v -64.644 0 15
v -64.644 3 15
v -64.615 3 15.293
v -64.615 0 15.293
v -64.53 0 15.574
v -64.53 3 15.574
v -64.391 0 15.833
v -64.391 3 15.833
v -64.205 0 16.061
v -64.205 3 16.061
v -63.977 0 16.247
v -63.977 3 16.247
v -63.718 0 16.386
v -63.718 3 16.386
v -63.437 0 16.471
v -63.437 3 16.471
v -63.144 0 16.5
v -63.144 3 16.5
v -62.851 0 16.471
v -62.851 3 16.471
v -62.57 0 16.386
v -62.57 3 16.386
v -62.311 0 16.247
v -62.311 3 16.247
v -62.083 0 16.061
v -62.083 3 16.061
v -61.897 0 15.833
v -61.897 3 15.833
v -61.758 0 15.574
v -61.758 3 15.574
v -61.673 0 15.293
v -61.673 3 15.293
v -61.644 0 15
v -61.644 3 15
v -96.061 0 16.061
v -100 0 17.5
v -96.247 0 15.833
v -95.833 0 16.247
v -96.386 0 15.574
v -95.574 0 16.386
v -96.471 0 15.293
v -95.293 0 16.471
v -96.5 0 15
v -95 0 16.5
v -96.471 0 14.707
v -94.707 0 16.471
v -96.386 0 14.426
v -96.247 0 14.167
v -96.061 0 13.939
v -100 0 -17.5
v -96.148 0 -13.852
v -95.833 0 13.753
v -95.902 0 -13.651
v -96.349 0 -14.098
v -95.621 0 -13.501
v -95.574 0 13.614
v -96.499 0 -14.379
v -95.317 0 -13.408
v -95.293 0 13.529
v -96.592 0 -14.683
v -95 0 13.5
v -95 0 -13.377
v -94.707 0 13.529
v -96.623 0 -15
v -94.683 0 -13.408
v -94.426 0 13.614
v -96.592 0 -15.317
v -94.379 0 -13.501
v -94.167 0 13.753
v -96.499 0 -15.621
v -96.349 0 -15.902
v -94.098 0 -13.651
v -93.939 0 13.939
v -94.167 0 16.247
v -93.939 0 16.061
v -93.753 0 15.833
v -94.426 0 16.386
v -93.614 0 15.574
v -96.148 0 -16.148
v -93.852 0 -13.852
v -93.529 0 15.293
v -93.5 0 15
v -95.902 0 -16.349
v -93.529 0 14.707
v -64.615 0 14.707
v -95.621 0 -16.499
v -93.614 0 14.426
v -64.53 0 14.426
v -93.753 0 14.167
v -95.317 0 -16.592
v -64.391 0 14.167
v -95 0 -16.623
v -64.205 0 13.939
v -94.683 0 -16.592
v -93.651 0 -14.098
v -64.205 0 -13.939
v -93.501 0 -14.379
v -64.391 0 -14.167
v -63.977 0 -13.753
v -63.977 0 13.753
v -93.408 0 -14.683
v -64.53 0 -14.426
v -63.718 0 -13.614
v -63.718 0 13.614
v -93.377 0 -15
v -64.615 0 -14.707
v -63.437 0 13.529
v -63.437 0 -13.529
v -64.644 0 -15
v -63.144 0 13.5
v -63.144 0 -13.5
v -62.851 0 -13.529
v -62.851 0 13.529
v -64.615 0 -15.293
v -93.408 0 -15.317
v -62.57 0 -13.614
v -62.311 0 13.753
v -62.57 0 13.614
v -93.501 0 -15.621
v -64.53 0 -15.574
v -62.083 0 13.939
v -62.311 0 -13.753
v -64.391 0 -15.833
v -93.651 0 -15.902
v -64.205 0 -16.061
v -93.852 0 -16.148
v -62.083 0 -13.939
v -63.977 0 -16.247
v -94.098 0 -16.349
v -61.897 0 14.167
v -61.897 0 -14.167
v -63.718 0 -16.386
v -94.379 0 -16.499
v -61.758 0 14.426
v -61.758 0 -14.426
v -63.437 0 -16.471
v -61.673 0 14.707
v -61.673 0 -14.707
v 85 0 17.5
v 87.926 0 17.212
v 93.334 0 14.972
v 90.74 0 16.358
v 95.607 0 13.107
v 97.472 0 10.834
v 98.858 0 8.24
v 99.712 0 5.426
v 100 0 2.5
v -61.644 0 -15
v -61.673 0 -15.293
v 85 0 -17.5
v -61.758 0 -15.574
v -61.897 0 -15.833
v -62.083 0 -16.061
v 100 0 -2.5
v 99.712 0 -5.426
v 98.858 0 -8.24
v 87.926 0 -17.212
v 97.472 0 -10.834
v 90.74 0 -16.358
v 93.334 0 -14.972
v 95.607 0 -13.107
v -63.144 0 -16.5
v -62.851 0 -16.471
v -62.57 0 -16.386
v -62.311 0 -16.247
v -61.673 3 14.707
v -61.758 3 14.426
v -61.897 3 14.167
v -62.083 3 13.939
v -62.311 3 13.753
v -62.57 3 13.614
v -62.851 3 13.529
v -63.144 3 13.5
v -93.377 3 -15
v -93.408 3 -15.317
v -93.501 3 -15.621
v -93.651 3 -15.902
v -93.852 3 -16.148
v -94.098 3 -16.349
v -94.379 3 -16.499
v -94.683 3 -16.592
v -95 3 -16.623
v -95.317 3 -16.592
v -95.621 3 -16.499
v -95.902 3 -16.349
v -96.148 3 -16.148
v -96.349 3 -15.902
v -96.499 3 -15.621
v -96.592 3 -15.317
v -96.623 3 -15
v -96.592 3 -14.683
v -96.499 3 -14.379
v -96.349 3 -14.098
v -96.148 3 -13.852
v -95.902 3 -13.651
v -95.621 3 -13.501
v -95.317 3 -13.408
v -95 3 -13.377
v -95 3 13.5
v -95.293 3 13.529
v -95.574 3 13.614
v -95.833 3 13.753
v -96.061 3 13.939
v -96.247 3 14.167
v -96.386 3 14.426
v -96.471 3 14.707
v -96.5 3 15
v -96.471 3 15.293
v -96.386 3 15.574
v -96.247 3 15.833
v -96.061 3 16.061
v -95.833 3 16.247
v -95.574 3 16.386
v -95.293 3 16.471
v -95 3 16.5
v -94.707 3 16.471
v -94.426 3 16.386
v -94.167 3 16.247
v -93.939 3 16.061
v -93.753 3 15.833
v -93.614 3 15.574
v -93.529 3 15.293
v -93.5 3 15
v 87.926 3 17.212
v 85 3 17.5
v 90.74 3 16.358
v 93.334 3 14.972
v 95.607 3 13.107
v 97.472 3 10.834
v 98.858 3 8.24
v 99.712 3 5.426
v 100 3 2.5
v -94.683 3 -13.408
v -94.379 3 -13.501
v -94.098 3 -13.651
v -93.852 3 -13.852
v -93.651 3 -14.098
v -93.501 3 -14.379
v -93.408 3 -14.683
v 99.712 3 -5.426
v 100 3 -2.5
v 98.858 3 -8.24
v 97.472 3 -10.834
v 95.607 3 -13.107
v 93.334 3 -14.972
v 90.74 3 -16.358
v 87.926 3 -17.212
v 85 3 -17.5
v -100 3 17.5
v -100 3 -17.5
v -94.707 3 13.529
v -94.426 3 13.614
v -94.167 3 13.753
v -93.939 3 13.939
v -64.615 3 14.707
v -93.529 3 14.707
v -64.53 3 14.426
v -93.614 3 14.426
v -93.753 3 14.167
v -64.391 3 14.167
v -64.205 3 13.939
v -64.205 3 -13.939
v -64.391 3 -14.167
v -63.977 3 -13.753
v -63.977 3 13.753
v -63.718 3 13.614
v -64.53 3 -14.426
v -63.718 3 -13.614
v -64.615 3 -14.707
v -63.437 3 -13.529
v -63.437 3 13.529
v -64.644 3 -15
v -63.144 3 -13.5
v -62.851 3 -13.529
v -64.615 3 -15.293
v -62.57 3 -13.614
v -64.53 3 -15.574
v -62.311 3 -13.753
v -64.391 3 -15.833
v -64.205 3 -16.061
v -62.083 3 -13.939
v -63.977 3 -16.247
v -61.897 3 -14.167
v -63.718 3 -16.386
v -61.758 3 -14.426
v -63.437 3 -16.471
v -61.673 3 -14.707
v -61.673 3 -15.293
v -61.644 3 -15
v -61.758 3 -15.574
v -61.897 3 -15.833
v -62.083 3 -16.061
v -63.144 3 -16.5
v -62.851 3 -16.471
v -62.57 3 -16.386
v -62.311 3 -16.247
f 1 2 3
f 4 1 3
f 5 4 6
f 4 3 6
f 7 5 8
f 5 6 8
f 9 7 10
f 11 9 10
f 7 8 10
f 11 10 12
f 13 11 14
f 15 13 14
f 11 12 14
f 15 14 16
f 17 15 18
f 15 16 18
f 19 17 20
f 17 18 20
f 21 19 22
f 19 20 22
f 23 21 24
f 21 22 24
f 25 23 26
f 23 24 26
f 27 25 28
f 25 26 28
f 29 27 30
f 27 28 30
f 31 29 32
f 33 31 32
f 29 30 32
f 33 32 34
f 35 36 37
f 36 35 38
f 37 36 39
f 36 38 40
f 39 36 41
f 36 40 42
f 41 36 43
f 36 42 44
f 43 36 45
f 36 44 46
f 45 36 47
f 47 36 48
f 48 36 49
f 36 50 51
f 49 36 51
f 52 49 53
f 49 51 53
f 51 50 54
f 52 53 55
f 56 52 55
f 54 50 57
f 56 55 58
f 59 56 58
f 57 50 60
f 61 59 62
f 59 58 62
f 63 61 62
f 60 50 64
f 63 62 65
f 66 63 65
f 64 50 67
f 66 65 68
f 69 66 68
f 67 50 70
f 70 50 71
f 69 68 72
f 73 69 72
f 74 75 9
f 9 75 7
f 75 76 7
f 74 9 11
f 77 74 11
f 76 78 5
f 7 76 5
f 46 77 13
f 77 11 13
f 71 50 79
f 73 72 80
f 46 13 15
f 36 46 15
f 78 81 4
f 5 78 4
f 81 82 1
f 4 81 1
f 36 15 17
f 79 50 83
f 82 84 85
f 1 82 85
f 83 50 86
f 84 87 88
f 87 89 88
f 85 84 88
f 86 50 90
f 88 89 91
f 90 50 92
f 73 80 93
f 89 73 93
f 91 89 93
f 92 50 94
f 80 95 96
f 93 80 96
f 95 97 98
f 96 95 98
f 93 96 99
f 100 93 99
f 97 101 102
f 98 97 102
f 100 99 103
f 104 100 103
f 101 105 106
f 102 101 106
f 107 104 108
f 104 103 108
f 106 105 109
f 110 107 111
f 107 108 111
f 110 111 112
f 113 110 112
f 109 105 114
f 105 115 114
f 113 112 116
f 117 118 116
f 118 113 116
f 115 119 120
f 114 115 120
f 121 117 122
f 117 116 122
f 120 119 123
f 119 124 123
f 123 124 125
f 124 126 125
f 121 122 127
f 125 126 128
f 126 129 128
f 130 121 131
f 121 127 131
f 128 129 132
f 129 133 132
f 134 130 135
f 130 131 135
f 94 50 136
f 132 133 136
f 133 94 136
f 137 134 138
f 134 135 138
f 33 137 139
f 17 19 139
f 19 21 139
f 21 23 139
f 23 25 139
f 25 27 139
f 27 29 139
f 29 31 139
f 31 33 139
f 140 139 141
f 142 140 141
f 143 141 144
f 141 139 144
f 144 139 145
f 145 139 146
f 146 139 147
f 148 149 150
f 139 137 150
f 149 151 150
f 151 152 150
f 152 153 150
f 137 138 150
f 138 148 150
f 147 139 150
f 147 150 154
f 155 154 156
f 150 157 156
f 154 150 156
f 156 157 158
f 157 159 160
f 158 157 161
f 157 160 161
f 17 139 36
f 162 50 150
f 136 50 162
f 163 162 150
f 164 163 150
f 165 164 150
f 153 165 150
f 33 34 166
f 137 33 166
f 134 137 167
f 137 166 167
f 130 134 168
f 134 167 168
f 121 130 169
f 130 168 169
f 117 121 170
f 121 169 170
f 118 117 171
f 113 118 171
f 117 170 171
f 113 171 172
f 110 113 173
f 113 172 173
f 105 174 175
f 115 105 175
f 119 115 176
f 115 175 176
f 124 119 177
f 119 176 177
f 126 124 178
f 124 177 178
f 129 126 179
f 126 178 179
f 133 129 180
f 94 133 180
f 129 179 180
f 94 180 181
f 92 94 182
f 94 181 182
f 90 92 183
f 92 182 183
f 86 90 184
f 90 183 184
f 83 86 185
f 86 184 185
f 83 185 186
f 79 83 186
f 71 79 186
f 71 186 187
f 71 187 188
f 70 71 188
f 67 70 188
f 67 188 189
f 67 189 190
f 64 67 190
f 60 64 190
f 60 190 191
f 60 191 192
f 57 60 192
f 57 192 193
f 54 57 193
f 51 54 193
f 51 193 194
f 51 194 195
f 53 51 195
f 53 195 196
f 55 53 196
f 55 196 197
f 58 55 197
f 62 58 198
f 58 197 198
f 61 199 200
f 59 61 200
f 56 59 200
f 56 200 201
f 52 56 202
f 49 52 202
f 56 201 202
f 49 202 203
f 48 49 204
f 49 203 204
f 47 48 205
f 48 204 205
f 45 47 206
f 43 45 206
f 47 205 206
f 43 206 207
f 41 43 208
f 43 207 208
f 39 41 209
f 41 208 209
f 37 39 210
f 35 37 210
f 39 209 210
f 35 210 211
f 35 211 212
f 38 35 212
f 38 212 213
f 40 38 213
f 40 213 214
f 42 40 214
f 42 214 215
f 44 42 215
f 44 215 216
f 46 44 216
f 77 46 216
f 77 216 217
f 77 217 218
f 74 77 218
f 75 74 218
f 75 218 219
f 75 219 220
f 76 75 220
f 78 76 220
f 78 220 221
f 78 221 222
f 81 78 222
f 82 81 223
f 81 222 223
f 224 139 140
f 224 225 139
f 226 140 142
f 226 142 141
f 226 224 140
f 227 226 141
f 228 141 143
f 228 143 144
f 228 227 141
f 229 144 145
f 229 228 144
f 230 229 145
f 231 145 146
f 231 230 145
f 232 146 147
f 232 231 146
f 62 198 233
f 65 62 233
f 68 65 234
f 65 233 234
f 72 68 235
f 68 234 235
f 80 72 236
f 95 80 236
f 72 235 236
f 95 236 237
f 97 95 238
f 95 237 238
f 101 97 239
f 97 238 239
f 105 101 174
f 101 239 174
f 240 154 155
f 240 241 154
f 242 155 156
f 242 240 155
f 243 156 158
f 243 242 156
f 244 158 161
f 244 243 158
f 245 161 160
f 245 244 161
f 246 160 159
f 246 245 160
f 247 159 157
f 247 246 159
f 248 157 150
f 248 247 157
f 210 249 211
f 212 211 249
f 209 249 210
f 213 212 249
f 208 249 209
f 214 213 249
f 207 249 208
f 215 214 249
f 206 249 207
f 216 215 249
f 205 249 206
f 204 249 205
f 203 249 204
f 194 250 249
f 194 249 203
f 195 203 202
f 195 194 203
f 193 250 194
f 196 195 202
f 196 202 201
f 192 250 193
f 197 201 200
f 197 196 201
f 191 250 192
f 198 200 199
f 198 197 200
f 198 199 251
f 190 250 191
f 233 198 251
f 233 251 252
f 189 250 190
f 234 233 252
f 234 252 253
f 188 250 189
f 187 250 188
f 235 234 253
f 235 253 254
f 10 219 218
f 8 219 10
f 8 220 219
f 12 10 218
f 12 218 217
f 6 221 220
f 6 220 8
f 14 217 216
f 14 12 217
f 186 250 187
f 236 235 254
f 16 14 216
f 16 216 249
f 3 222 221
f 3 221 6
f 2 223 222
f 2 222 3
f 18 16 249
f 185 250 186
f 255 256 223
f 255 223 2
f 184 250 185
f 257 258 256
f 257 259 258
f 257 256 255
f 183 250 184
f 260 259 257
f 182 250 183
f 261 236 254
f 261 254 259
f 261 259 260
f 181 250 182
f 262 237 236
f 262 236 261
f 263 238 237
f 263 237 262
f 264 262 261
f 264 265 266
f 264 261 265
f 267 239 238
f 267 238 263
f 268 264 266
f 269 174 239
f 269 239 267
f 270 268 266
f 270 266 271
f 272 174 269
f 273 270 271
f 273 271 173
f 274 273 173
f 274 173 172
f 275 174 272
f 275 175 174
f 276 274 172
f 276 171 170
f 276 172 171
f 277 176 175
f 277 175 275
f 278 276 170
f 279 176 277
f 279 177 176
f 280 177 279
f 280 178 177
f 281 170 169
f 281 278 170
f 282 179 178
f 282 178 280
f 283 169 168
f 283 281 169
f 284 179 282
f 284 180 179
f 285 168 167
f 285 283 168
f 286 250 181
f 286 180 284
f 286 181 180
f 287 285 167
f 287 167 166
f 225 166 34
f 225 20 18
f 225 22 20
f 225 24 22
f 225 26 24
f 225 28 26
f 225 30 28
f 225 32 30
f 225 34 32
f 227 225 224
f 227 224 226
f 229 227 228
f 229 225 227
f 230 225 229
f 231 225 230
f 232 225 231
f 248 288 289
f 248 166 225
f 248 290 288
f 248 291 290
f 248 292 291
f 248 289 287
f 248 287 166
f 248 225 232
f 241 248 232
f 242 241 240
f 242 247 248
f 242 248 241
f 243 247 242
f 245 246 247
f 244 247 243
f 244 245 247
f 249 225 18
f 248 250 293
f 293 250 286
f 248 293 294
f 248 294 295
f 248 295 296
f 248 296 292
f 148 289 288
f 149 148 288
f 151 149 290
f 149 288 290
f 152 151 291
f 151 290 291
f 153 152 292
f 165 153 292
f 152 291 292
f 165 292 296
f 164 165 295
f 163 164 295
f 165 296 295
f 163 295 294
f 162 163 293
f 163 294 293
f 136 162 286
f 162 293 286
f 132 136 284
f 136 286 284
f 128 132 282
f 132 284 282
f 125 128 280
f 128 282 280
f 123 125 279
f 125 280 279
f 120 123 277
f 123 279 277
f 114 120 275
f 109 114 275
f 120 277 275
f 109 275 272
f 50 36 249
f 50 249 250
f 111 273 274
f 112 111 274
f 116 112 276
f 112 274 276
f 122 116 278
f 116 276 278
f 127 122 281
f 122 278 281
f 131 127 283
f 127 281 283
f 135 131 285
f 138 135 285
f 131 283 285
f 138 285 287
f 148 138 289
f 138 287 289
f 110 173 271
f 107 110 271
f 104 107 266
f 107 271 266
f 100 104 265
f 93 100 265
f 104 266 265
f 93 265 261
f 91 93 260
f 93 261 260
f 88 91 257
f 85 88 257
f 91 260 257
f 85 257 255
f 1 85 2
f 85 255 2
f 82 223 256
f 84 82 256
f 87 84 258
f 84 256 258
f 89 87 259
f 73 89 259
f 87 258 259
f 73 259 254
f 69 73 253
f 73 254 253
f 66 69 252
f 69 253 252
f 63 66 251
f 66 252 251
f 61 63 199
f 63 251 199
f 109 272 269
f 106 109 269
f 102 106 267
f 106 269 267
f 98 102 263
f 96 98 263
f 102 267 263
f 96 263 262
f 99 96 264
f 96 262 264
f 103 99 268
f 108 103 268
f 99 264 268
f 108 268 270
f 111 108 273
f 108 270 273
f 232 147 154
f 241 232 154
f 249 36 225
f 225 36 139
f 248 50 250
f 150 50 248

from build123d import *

# Parameters (mm, degrees)
SKETCH1_W           = 200
SKETCH1_H           = 35
BOSS_EXTRUDE1_DEPTH = 3
FILLET1_R           = 15
CUT_EXTRUDE1_DEPTH  = 102.564019219


with BuildPart() as part:
    # Sketch1 → Boss-Extrude1 (new body)
    with BuildSketch(Plane(origin=(0, 0, 0), x_dir=(1, 0, 0), z_dir=(0, 1, 0))):
        Rectangle(SKETCH1_W, SKETCH1_H)
    extrude(amount=BOSS_EXTRUDE1_DEPTH)

    # Fillet1
    fillet1_edges = [part.edges().sort_by_distance(p)[0] for p in [
        (100, 1.5, -17.5),
        (100, 1.5, 17.5),
    ]]
    fillet(fillet1_edges, radius=FILLET1_R)

    # Sketch2 → Cut-Extrude1 (cut, through all)
    with BuildSketch(Plane(origin=(0, 3, 0), x_dir=(1, 0, 0), z_dir=(0, 1, 0))):
        with BuildLine():
            ThreePointArc((-93.377001476, 15), (-96.147633262, 16.147633262), (-95, 13.377001476))
            Line((-95, 13.377001476), (-95, 15))
            Line((-95, 15), (-93.377001476, 15))
        make_face()
        with BuildLine():
            Line((-95, 15), (-95, 13.377001476))
            ThreePointArc((-95, 13.377001476), (-93.852366738, 13.852366738), (-93.377001476, 15))
            Line((-93.377001476, 15), (-95, 15))
        make_face()
        with BuildLine():
            ThreePointArc((-95, -13.5), (-96.060660172, -16.060660172), (-93.5, -15))
            Line((-93.5, -15), (-95, -15))
            Line((-95, -15), (-95, -13.5))
        make_face()
        with BuildLine():
            Line((-95, -15), (-93.5, -15))
            ThreePointArc((-93.5, -15), (-93.939339828, -13.939339828), (-95, -13.5))
            Line((-95, -13.5), (-95, -15))
        make_face()
        with BuildLine():
            ThreePointArc((-63.143993753, -13.5), (-64.204653925, -13.939339828), (-64.643993753, -15))
            Line((-64.643993753, -15), (-63.143993753, -15))
            Line((-63.143993753, -15), (-63.143993753, -13.5))
        make_face()
        with BuildLine():
            Line((-63.143993753, -15), (-64.643993753, -15))
            ThreePointArc((-64.643993753, -15), (-63.143993753, -16.5), (-61.643993753, -15))
            ThreePointArc((-61.643993753, -15), (-62.083333581, -13.939339828), (-63.143993753, -13.5))
            Line((-63.143993753, -13.5), (-63.143993753, -15))
        make_face()
        with BuildLine():
            ThreePointArc((-64.643993753, 15), (-64.204653925, 13.939339828), (-63.143993753, 13.5))
            Line((-63.143993753, 13.5), (-63.143993753, 15))
            Line((-63.143993753, 15), (-64.643993753, 15))
        make_face()
        with BuildLine():
            Line((-63.143993753, 15), (-63.143993753, 13.5))
            ThreePointArc((-63.143993753, 13.5), (-62.083333581, 13.939339828), (-61.643993753, 15))
            ThreePointArc((-61.643993753, 15), (-63.143993753, 16.5), (-64.643993753, 15))
            Line((-64.643993753, 15), (-63.143993753, 15))
        make_face()
    extrude(amount=-CUT_EXTRUDE1_DEPTH, mode=Mode.SUBTRACT)


solid = part.part
